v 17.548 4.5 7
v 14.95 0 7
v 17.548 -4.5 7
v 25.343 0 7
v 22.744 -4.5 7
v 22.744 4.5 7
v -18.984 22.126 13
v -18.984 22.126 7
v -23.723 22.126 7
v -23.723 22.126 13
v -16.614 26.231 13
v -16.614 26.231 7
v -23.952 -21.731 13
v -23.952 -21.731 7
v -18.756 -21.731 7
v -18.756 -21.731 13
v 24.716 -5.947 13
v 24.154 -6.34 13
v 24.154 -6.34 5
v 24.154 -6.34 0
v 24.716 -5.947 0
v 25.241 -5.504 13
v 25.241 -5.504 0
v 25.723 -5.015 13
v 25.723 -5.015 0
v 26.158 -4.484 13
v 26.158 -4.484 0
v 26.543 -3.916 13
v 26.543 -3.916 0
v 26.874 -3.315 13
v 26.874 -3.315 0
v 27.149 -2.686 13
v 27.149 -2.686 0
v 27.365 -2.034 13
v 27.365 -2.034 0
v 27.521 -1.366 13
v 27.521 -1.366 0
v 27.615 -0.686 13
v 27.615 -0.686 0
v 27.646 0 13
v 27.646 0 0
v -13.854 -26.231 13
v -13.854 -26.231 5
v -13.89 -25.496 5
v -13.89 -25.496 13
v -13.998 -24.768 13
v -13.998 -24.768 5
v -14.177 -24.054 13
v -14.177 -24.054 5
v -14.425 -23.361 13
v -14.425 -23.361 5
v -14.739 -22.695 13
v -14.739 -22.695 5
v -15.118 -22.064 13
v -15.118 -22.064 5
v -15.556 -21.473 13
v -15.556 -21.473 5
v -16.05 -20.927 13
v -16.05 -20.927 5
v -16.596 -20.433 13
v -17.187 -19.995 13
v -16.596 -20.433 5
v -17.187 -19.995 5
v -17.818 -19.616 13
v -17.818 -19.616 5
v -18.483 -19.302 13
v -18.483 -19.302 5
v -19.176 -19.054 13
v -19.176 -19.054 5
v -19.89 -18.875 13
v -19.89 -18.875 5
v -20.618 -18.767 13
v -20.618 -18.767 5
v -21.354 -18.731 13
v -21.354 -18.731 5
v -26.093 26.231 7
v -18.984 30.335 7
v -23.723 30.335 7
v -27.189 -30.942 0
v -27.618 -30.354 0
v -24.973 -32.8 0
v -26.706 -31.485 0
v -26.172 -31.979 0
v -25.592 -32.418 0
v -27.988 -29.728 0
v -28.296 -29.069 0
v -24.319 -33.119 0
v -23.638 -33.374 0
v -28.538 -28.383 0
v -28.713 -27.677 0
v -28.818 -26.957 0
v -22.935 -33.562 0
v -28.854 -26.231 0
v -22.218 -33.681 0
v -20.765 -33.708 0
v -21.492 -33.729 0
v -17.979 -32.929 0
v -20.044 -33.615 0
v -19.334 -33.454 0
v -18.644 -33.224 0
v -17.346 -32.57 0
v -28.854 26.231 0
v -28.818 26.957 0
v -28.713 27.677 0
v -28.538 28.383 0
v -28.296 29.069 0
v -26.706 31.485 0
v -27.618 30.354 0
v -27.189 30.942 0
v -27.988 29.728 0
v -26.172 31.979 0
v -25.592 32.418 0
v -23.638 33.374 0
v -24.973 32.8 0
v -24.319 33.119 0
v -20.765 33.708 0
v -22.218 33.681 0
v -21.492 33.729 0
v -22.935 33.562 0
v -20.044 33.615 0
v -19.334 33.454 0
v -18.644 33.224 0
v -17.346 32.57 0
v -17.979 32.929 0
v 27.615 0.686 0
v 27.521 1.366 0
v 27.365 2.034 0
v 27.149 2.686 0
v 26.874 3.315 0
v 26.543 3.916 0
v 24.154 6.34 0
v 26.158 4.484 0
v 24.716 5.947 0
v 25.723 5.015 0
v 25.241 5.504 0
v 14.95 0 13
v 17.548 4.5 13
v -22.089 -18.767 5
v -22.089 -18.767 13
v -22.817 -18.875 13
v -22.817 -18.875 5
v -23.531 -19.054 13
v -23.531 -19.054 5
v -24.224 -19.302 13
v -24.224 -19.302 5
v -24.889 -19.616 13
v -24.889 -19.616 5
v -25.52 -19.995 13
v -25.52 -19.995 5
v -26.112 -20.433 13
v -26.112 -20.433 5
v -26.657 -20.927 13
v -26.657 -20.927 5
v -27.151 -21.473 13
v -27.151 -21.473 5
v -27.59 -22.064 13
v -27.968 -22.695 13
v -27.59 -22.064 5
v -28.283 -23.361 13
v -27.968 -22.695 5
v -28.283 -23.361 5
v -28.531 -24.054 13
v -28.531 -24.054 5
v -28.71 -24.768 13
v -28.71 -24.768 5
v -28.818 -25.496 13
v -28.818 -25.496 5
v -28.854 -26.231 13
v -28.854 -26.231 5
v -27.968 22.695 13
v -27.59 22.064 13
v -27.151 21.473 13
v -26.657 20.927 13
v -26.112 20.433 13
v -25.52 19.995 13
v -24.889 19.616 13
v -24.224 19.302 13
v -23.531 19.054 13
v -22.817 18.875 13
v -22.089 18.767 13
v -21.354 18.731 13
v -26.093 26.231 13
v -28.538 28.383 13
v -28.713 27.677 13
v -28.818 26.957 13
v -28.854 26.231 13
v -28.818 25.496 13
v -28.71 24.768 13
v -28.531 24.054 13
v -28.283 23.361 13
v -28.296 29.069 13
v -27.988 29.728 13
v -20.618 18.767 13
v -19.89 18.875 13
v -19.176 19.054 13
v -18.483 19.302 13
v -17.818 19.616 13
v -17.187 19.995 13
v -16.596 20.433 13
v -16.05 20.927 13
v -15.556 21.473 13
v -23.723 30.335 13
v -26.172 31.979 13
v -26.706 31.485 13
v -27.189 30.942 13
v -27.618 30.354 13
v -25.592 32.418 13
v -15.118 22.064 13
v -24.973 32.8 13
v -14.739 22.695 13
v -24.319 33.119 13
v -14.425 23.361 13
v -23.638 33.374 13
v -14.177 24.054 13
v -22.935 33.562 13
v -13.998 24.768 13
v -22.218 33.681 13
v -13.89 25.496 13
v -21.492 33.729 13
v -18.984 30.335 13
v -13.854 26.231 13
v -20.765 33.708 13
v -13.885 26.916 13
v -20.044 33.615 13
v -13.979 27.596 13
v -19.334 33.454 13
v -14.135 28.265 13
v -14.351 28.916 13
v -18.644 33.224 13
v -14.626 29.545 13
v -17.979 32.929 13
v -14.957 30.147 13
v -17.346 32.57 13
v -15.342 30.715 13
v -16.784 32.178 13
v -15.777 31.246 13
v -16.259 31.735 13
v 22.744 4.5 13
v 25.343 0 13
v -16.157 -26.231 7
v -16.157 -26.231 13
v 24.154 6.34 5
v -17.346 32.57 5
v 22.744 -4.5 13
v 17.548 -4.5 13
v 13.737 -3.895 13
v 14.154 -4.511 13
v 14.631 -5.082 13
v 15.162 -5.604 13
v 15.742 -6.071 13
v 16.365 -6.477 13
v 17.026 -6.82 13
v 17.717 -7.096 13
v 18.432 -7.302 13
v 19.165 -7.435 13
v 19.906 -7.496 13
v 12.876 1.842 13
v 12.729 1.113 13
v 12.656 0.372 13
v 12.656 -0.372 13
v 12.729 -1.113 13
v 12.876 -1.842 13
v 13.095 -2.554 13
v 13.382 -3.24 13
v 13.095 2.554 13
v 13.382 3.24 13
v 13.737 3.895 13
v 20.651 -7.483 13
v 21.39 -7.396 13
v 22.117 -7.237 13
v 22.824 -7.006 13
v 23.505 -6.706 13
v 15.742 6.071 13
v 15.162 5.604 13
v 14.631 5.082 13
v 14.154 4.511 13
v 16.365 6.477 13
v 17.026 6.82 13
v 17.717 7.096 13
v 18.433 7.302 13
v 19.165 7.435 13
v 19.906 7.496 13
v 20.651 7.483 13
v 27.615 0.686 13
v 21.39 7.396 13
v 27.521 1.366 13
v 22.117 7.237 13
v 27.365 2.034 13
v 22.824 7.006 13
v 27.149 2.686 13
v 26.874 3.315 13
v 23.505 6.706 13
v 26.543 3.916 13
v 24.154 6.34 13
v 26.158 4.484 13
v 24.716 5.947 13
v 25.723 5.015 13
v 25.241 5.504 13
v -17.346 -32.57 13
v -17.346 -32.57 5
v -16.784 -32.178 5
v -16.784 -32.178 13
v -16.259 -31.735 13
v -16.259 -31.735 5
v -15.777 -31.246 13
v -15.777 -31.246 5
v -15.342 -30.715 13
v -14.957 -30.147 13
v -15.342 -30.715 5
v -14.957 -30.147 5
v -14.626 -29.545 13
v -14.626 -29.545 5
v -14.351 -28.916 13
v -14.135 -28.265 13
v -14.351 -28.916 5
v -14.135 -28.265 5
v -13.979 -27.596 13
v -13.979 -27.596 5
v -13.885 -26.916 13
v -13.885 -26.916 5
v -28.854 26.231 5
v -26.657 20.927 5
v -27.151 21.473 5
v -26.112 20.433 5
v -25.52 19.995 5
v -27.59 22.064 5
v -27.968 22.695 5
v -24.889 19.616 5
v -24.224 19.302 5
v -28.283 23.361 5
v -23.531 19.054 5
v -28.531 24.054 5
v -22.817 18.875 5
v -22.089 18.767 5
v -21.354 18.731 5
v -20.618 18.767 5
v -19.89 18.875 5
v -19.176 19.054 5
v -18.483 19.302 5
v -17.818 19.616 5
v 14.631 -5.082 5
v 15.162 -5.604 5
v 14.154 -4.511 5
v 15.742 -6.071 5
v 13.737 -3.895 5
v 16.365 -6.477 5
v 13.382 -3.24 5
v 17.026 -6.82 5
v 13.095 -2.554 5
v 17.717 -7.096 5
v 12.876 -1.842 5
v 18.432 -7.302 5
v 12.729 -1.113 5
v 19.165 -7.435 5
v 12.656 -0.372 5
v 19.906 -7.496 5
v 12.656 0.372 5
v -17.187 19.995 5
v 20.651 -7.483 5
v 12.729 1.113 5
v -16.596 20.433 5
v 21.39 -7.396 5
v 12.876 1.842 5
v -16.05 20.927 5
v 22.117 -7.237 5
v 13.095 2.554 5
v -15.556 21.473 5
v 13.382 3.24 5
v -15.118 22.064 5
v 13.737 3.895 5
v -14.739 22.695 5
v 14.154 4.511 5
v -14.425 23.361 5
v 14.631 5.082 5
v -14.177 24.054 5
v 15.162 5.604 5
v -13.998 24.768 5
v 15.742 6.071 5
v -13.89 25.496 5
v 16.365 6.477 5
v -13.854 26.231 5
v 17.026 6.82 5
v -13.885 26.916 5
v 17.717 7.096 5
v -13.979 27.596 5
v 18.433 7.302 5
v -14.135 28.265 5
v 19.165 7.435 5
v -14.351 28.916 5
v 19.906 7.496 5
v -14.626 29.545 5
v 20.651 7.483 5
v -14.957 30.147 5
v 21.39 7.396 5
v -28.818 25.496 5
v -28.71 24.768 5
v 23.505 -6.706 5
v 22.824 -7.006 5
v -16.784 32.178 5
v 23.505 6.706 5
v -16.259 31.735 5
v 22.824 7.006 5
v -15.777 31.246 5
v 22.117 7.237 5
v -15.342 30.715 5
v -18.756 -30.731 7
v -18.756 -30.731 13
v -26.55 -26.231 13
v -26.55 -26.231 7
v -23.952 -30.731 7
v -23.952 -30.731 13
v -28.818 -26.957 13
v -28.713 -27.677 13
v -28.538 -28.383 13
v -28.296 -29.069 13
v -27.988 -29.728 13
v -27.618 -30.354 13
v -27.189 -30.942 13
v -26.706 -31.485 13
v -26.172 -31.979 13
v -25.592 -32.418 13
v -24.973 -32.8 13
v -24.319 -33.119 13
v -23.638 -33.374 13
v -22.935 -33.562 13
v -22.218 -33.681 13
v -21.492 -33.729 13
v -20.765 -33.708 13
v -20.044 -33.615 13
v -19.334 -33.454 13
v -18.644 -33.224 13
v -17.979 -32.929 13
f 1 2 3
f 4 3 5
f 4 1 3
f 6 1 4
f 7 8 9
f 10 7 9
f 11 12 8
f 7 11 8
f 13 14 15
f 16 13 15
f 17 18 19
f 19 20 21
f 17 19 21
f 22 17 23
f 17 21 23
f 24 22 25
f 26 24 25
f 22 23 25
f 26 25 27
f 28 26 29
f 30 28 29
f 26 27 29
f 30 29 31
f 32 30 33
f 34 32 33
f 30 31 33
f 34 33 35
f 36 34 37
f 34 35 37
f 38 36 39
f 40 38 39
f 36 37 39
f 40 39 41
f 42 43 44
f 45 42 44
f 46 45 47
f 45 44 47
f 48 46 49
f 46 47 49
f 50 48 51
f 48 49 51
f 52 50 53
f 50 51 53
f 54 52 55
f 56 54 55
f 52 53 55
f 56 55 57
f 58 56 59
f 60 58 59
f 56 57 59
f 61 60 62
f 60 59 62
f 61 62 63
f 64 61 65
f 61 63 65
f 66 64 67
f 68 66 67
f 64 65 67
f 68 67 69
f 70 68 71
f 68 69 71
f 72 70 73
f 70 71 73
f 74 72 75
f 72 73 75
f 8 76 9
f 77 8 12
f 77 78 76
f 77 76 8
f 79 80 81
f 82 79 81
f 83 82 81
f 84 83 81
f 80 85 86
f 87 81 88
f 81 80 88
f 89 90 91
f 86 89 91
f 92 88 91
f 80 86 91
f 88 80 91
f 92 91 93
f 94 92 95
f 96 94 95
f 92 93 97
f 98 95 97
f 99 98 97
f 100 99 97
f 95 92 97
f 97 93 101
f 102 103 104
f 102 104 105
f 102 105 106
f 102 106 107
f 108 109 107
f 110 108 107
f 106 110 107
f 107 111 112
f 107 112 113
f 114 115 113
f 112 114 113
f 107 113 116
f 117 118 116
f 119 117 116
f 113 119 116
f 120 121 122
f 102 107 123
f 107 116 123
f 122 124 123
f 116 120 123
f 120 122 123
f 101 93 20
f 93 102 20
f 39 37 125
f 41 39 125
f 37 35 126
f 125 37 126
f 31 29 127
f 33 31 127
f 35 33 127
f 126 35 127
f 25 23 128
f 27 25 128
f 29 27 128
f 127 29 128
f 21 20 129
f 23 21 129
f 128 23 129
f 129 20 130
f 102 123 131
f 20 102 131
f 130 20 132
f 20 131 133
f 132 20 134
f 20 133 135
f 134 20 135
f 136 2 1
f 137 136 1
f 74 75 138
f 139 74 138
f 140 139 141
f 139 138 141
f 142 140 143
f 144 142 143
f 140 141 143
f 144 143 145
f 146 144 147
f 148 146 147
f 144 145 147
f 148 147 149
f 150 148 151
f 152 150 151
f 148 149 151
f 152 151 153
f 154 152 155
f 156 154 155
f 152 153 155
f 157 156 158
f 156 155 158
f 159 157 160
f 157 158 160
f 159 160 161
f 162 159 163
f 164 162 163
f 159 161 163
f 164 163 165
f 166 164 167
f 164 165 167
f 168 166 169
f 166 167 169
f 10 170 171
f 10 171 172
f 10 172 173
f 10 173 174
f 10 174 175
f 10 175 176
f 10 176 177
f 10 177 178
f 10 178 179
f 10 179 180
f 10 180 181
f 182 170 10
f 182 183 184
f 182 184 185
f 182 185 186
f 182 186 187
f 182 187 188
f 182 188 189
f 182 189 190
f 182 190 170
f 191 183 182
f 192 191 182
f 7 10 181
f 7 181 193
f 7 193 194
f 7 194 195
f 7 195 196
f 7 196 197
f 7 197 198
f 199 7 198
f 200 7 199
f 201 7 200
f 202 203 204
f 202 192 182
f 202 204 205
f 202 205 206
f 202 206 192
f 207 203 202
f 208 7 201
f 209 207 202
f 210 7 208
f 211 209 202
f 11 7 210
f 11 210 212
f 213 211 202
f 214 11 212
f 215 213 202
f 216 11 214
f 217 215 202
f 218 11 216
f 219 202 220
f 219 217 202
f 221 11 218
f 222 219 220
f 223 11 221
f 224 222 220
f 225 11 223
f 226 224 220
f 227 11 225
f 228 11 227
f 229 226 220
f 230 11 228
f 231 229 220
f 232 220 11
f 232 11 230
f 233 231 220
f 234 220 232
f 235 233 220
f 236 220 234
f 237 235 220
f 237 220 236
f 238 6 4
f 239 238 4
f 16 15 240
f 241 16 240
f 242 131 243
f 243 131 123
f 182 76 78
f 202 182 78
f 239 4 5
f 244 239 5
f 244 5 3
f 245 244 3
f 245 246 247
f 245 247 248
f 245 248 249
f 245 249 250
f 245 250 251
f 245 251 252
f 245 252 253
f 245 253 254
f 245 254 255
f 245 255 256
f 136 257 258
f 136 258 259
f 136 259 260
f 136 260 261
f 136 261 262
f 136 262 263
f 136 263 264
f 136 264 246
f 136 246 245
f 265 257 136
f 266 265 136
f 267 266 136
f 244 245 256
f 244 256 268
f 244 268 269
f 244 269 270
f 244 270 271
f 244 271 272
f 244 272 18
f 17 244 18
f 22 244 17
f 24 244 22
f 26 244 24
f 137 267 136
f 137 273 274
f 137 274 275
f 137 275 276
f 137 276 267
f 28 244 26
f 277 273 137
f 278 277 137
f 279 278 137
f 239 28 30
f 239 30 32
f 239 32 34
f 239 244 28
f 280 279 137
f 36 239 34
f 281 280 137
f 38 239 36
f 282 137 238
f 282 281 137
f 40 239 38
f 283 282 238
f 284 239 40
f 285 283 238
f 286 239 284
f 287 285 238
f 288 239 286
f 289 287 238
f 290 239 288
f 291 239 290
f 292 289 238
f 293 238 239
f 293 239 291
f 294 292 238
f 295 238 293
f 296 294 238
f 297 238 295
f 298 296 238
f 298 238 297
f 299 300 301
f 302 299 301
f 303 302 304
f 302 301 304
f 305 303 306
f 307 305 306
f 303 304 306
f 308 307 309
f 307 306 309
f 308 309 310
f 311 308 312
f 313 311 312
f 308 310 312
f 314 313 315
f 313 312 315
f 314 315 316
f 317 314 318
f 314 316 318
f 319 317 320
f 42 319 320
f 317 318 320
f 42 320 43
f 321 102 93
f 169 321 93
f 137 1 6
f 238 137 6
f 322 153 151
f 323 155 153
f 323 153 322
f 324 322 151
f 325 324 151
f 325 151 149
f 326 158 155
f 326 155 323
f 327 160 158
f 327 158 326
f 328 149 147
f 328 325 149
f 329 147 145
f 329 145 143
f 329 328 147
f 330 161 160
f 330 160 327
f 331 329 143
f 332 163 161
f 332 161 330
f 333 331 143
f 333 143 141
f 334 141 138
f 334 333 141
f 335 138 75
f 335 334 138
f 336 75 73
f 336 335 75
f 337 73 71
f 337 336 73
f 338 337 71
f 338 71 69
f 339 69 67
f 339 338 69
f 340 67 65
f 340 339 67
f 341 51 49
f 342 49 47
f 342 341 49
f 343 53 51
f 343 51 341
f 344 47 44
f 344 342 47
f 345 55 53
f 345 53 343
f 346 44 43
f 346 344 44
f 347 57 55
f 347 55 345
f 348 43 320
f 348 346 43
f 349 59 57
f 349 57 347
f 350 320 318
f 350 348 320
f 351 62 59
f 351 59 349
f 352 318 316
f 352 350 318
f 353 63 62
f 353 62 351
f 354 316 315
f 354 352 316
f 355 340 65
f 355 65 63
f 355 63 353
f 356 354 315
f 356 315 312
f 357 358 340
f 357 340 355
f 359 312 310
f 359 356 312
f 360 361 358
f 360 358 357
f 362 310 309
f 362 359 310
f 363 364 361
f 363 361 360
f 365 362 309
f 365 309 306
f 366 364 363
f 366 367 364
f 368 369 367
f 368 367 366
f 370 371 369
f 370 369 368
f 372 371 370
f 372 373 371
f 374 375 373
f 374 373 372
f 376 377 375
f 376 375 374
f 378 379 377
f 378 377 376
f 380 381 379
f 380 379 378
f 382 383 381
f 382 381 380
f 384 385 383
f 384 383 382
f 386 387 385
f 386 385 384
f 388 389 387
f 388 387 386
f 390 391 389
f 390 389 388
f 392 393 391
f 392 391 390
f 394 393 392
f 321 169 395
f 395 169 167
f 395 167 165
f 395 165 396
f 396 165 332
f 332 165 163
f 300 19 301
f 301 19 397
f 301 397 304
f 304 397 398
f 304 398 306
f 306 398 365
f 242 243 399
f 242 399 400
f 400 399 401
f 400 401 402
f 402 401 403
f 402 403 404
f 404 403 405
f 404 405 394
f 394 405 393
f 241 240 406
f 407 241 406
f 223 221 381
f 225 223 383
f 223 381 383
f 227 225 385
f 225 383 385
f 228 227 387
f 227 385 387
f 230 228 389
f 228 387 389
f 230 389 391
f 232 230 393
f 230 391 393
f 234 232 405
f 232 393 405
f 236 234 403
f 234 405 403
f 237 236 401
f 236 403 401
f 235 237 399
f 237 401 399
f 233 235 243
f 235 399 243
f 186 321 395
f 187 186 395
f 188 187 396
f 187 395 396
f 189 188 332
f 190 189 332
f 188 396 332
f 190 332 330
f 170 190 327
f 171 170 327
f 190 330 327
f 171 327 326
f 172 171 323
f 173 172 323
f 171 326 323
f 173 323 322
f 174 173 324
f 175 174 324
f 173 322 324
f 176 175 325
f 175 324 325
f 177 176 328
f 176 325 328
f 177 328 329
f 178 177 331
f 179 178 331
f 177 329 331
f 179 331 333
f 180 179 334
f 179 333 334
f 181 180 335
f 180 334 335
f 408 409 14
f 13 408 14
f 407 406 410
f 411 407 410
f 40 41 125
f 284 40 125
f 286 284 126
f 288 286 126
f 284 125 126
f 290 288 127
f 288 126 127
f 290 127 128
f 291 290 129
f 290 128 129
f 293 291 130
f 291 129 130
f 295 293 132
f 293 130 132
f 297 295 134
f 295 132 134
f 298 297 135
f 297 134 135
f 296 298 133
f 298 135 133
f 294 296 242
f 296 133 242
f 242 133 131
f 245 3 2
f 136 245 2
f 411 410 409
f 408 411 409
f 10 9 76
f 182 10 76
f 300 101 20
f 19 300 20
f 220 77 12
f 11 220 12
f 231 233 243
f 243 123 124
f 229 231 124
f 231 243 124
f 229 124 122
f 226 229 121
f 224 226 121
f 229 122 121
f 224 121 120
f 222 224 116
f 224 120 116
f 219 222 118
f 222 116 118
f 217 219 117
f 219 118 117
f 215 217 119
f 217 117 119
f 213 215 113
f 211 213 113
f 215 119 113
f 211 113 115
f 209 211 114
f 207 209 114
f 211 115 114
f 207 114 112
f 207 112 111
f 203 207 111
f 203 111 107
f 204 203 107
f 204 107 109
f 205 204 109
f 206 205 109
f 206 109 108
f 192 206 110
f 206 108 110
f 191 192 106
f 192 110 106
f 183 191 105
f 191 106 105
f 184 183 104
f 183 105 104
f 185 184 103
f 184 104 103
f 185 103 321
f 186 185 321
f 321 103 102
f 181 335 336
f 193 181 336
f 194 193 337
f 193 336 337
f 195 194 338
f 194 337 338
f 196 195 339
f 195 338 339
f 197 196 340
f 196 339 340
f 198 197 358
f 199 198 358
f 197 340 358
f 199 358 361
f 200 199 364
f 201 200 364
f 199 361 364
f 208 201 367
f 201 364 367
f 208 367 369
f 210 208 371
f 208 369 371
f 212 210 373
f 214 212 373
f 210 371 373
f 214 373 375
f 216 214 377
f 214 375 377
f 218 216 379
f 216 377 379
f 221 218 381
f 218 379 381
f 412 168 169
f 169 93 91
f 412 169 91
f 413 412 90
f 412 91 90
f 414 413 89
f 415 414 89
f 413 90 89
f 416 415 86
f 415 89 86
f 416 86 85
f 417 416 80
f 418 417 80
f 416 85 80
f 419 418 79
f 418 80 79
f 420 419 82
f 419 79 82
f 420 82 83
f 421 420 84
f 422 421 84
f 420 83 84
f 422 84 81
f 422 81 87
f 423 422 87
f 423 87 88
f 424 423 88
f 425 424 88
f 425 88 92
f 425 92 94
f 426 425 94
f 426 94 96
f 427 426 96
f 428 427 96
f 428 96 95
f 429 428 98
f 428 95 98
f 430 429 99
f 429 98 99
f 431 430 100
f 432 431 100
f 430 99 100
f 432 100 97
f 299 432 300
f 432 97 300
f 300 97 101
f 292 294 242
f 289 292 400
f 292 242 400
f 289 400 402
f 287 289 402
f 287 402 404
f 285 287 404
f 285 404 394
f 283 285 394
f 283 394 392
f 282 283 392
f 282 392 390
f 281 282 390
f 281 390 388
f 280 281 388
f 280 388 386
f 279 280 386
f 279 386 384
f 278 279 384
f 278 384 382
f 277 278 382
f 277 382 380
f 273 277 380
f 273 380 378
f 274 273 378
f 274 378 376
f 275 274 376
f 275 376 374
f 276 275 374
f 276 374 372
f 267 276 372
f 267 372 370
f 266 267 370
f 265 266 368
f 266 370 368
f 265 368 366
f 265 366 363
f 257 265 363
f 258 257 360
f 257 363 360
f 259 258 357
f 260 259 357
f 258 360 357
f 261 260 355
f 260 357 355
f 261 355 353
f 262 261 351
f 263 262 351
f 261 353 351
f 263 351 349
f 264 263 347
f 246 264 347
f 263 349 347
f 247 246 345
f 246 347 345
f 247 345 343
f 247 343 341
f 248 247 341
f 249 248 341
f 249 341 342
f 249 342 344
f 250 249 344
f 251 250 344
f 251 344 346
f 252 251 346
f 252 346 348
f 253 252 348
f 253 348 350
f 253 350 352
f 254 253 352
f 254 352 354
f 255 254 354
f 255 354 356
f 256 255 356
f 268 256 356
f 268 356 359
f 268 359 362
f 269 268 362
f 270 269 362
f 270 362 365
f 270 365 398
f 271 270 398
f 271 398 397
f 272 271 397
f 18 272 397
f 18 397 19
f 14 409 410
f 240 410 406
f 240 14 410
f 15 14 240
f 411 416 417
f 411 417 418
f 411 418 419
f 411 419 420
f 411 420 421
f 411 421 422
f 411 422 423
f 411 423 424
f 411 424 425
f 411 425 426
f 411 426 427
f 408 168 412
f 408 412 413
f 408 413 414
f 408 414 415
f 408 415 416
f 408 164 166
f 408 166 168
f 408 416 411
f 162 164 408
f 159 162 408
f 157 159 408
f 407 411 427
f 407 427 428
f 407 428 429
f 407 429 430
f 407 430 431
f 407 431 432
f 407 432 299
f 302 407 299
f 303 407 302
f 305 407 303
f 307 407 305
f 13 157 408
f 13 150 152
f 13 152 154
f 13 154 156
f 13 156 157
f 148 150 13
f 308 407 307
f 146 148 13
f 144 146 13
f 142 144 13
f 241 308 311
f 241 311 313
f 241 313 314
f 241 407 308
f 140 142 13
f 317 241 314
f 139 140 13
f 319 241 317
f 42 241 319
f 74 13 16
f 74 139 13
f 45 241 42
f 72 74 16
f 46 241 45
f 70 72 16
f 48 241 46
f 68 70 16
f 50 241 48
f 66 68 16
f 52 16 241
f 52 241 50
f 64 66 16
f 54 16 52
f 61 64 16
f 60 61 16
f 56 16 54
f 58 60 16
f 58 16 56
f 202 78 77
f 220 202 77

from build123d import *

# Parameters (mm, degrees)
F1_DEPTH = 5
F2_DEPTH = 13
F3_DEPTH = 7


with BuildPart() as f1:
    # F0 (on Top) → F1 (new body)
    with BuildSketch(Plane.XY):
        with BuildLine():
            ThreePointArc((-21.353622, 18.730685), (-26.656923, 20.927384), (-28.853622, 26.230685))
            Line((-28.853622, 26.230685), (-28.853622, -26.230685))
            ThreePointArc((-28.853622, -26.230685), (-26.656923, -20.927384), (-21.353622, -18.730685))
            Line((-21.353622, -18.730685), (-21.353622, 18.730685))
        make_face()
        with BuildLine():
            ThreePointArc((24.153526, -6.339776), (12.646378, 0), (24.153527, 6.339776))
            Line((24.153527, 6.339776), (-17.346473, 32.570461))
            ThreePointArc((-17.346473, 32.570461), (-14.784619, 29.849828), (-13.853622, 26.230685))
            ThreePointArc((-13.853622, 26.230685), (-16.050321, 20.927384), (-21.353622, 18.730685))
            Line((-21.353622, 18.730685), (-21.353622, -18.730685))
            ThreePointArc((-21.353622, -18.730685), (-16.050321, -20.927384), (-13.853622, -26.230685))
            ThreePointArc((-13.853622, -26.230685), (-14.784619, -29.849828), (-17.346473, -32.570461))
            Line((-17.346473, -32.570461), (24.153526, -6.339776))
        make_face()
    extrude(amount=F1_DEPTH)

    # F0 (on Top) → F2 (join)
    with BuildSketch(Plane.XY):
        with BuildLine():
            ThreePointArc((-28.853622, -26.230685), (-24.972765, -32.799689), (-17.346473, -32.570461))
            ThreePointArc((-17.346473, -32.570461), (-14.784619, -29.849828), (-13.853622, -26.230685))
            ThreePointArc((-13.853622, -26.230685), (-16.050321, -20.927384), (-21.353622, -18.730685))
            ThreePointArc((-21.353622, -18.730685), (-26.656923, -20.927384), (-28.853622, -26.230685))
        make_face()
        Polygon((-23.951698, -21.730685), (-21.353622, -21.730685), (-18.755546, -21.730685), (-16.15747, -26.230685), (-18.755546, -30.730685), (-23.951698, -30.730685), (-26.549775, -26.230685), align=None, mode=Mode.SUBTRACT)
        with BuildLine():
            ThreePointArc((24.153526, -6.339776), (26.715381, -3.619143), (27.646378, 0))
            ThreePointArc((27.646378, 0), (26.715381, 3.619143), (24.153527, 6.339776))
            ThreePointArc((24.153527, 6.339776), (12.646378, 0), (24.153526, -6.339776))
        make_face()
        Polygon((25.34253, 0), (22.744454, -4.5), (17.548302, -4.5), (14.950225, 0), (17.548302, 4.5), (22.744454, 4.5), align=None, mode=Mode.SUBTRACT)
        with BuildLine():
            ThreePointArc((-13.853622, 26.230685), (-14.784619, 29.849828), (-17.346473, 32.570461))
            ThreePointArc((-17.346473, 32.570461), (-24.972765, 32.799689), (-28.853622, 26.230685))
            ThreePointArc((-28.853622, 26.230685), (-26.656923, 20.927384), (-21.353622, 18.730685))
            ThreePointArc((-21.353622, 18.730685), (-16.050321, 20.927384), (-13.853622, 26.230685))
        make_face()
        Polygon((-18.983858, 22.126133), (-21.353622, 22.126133), (-23.723387, 22.126133), (-26.093151, 26.230685), (-23.723387, 30.335237), (-18.983858, 30.335237), (-16.614093, 26.230685), align=None, mode=Mode.SUBTRACT)
    extrude(amount=F2_DEPTH)

    # F0 (on Top) → F3 (join)
    with BuildSketch(Plane.XY):
        Polygon((-23.723387, 22.126133), (-21.353622, 22.126133), (-18.983858, 22.126133), (-16.614093, 26.230685), (-18.983858, 30.335237), (-23.723387, 30.335237), (-26.093151, 26.230685), align=None)
        Polygon((-18.755546, -21.730685), (-21.353622, -21.730685), (-23.951698, -21.730685), (-26.549775, -26.230685), (-23.951698, -30.730685), (-18.755546, -30.730685), (-16.15747, -26.230685), align=None)
        Polygon((17.548302, -4.5), (22.744454, -4.5), (25.34253, 0), (22.744454, 4.5), (17.548302, 4.5), (14.950225, 0), align=None)
    extrude(amount=F3_DEPTH)


solid = f1.part
